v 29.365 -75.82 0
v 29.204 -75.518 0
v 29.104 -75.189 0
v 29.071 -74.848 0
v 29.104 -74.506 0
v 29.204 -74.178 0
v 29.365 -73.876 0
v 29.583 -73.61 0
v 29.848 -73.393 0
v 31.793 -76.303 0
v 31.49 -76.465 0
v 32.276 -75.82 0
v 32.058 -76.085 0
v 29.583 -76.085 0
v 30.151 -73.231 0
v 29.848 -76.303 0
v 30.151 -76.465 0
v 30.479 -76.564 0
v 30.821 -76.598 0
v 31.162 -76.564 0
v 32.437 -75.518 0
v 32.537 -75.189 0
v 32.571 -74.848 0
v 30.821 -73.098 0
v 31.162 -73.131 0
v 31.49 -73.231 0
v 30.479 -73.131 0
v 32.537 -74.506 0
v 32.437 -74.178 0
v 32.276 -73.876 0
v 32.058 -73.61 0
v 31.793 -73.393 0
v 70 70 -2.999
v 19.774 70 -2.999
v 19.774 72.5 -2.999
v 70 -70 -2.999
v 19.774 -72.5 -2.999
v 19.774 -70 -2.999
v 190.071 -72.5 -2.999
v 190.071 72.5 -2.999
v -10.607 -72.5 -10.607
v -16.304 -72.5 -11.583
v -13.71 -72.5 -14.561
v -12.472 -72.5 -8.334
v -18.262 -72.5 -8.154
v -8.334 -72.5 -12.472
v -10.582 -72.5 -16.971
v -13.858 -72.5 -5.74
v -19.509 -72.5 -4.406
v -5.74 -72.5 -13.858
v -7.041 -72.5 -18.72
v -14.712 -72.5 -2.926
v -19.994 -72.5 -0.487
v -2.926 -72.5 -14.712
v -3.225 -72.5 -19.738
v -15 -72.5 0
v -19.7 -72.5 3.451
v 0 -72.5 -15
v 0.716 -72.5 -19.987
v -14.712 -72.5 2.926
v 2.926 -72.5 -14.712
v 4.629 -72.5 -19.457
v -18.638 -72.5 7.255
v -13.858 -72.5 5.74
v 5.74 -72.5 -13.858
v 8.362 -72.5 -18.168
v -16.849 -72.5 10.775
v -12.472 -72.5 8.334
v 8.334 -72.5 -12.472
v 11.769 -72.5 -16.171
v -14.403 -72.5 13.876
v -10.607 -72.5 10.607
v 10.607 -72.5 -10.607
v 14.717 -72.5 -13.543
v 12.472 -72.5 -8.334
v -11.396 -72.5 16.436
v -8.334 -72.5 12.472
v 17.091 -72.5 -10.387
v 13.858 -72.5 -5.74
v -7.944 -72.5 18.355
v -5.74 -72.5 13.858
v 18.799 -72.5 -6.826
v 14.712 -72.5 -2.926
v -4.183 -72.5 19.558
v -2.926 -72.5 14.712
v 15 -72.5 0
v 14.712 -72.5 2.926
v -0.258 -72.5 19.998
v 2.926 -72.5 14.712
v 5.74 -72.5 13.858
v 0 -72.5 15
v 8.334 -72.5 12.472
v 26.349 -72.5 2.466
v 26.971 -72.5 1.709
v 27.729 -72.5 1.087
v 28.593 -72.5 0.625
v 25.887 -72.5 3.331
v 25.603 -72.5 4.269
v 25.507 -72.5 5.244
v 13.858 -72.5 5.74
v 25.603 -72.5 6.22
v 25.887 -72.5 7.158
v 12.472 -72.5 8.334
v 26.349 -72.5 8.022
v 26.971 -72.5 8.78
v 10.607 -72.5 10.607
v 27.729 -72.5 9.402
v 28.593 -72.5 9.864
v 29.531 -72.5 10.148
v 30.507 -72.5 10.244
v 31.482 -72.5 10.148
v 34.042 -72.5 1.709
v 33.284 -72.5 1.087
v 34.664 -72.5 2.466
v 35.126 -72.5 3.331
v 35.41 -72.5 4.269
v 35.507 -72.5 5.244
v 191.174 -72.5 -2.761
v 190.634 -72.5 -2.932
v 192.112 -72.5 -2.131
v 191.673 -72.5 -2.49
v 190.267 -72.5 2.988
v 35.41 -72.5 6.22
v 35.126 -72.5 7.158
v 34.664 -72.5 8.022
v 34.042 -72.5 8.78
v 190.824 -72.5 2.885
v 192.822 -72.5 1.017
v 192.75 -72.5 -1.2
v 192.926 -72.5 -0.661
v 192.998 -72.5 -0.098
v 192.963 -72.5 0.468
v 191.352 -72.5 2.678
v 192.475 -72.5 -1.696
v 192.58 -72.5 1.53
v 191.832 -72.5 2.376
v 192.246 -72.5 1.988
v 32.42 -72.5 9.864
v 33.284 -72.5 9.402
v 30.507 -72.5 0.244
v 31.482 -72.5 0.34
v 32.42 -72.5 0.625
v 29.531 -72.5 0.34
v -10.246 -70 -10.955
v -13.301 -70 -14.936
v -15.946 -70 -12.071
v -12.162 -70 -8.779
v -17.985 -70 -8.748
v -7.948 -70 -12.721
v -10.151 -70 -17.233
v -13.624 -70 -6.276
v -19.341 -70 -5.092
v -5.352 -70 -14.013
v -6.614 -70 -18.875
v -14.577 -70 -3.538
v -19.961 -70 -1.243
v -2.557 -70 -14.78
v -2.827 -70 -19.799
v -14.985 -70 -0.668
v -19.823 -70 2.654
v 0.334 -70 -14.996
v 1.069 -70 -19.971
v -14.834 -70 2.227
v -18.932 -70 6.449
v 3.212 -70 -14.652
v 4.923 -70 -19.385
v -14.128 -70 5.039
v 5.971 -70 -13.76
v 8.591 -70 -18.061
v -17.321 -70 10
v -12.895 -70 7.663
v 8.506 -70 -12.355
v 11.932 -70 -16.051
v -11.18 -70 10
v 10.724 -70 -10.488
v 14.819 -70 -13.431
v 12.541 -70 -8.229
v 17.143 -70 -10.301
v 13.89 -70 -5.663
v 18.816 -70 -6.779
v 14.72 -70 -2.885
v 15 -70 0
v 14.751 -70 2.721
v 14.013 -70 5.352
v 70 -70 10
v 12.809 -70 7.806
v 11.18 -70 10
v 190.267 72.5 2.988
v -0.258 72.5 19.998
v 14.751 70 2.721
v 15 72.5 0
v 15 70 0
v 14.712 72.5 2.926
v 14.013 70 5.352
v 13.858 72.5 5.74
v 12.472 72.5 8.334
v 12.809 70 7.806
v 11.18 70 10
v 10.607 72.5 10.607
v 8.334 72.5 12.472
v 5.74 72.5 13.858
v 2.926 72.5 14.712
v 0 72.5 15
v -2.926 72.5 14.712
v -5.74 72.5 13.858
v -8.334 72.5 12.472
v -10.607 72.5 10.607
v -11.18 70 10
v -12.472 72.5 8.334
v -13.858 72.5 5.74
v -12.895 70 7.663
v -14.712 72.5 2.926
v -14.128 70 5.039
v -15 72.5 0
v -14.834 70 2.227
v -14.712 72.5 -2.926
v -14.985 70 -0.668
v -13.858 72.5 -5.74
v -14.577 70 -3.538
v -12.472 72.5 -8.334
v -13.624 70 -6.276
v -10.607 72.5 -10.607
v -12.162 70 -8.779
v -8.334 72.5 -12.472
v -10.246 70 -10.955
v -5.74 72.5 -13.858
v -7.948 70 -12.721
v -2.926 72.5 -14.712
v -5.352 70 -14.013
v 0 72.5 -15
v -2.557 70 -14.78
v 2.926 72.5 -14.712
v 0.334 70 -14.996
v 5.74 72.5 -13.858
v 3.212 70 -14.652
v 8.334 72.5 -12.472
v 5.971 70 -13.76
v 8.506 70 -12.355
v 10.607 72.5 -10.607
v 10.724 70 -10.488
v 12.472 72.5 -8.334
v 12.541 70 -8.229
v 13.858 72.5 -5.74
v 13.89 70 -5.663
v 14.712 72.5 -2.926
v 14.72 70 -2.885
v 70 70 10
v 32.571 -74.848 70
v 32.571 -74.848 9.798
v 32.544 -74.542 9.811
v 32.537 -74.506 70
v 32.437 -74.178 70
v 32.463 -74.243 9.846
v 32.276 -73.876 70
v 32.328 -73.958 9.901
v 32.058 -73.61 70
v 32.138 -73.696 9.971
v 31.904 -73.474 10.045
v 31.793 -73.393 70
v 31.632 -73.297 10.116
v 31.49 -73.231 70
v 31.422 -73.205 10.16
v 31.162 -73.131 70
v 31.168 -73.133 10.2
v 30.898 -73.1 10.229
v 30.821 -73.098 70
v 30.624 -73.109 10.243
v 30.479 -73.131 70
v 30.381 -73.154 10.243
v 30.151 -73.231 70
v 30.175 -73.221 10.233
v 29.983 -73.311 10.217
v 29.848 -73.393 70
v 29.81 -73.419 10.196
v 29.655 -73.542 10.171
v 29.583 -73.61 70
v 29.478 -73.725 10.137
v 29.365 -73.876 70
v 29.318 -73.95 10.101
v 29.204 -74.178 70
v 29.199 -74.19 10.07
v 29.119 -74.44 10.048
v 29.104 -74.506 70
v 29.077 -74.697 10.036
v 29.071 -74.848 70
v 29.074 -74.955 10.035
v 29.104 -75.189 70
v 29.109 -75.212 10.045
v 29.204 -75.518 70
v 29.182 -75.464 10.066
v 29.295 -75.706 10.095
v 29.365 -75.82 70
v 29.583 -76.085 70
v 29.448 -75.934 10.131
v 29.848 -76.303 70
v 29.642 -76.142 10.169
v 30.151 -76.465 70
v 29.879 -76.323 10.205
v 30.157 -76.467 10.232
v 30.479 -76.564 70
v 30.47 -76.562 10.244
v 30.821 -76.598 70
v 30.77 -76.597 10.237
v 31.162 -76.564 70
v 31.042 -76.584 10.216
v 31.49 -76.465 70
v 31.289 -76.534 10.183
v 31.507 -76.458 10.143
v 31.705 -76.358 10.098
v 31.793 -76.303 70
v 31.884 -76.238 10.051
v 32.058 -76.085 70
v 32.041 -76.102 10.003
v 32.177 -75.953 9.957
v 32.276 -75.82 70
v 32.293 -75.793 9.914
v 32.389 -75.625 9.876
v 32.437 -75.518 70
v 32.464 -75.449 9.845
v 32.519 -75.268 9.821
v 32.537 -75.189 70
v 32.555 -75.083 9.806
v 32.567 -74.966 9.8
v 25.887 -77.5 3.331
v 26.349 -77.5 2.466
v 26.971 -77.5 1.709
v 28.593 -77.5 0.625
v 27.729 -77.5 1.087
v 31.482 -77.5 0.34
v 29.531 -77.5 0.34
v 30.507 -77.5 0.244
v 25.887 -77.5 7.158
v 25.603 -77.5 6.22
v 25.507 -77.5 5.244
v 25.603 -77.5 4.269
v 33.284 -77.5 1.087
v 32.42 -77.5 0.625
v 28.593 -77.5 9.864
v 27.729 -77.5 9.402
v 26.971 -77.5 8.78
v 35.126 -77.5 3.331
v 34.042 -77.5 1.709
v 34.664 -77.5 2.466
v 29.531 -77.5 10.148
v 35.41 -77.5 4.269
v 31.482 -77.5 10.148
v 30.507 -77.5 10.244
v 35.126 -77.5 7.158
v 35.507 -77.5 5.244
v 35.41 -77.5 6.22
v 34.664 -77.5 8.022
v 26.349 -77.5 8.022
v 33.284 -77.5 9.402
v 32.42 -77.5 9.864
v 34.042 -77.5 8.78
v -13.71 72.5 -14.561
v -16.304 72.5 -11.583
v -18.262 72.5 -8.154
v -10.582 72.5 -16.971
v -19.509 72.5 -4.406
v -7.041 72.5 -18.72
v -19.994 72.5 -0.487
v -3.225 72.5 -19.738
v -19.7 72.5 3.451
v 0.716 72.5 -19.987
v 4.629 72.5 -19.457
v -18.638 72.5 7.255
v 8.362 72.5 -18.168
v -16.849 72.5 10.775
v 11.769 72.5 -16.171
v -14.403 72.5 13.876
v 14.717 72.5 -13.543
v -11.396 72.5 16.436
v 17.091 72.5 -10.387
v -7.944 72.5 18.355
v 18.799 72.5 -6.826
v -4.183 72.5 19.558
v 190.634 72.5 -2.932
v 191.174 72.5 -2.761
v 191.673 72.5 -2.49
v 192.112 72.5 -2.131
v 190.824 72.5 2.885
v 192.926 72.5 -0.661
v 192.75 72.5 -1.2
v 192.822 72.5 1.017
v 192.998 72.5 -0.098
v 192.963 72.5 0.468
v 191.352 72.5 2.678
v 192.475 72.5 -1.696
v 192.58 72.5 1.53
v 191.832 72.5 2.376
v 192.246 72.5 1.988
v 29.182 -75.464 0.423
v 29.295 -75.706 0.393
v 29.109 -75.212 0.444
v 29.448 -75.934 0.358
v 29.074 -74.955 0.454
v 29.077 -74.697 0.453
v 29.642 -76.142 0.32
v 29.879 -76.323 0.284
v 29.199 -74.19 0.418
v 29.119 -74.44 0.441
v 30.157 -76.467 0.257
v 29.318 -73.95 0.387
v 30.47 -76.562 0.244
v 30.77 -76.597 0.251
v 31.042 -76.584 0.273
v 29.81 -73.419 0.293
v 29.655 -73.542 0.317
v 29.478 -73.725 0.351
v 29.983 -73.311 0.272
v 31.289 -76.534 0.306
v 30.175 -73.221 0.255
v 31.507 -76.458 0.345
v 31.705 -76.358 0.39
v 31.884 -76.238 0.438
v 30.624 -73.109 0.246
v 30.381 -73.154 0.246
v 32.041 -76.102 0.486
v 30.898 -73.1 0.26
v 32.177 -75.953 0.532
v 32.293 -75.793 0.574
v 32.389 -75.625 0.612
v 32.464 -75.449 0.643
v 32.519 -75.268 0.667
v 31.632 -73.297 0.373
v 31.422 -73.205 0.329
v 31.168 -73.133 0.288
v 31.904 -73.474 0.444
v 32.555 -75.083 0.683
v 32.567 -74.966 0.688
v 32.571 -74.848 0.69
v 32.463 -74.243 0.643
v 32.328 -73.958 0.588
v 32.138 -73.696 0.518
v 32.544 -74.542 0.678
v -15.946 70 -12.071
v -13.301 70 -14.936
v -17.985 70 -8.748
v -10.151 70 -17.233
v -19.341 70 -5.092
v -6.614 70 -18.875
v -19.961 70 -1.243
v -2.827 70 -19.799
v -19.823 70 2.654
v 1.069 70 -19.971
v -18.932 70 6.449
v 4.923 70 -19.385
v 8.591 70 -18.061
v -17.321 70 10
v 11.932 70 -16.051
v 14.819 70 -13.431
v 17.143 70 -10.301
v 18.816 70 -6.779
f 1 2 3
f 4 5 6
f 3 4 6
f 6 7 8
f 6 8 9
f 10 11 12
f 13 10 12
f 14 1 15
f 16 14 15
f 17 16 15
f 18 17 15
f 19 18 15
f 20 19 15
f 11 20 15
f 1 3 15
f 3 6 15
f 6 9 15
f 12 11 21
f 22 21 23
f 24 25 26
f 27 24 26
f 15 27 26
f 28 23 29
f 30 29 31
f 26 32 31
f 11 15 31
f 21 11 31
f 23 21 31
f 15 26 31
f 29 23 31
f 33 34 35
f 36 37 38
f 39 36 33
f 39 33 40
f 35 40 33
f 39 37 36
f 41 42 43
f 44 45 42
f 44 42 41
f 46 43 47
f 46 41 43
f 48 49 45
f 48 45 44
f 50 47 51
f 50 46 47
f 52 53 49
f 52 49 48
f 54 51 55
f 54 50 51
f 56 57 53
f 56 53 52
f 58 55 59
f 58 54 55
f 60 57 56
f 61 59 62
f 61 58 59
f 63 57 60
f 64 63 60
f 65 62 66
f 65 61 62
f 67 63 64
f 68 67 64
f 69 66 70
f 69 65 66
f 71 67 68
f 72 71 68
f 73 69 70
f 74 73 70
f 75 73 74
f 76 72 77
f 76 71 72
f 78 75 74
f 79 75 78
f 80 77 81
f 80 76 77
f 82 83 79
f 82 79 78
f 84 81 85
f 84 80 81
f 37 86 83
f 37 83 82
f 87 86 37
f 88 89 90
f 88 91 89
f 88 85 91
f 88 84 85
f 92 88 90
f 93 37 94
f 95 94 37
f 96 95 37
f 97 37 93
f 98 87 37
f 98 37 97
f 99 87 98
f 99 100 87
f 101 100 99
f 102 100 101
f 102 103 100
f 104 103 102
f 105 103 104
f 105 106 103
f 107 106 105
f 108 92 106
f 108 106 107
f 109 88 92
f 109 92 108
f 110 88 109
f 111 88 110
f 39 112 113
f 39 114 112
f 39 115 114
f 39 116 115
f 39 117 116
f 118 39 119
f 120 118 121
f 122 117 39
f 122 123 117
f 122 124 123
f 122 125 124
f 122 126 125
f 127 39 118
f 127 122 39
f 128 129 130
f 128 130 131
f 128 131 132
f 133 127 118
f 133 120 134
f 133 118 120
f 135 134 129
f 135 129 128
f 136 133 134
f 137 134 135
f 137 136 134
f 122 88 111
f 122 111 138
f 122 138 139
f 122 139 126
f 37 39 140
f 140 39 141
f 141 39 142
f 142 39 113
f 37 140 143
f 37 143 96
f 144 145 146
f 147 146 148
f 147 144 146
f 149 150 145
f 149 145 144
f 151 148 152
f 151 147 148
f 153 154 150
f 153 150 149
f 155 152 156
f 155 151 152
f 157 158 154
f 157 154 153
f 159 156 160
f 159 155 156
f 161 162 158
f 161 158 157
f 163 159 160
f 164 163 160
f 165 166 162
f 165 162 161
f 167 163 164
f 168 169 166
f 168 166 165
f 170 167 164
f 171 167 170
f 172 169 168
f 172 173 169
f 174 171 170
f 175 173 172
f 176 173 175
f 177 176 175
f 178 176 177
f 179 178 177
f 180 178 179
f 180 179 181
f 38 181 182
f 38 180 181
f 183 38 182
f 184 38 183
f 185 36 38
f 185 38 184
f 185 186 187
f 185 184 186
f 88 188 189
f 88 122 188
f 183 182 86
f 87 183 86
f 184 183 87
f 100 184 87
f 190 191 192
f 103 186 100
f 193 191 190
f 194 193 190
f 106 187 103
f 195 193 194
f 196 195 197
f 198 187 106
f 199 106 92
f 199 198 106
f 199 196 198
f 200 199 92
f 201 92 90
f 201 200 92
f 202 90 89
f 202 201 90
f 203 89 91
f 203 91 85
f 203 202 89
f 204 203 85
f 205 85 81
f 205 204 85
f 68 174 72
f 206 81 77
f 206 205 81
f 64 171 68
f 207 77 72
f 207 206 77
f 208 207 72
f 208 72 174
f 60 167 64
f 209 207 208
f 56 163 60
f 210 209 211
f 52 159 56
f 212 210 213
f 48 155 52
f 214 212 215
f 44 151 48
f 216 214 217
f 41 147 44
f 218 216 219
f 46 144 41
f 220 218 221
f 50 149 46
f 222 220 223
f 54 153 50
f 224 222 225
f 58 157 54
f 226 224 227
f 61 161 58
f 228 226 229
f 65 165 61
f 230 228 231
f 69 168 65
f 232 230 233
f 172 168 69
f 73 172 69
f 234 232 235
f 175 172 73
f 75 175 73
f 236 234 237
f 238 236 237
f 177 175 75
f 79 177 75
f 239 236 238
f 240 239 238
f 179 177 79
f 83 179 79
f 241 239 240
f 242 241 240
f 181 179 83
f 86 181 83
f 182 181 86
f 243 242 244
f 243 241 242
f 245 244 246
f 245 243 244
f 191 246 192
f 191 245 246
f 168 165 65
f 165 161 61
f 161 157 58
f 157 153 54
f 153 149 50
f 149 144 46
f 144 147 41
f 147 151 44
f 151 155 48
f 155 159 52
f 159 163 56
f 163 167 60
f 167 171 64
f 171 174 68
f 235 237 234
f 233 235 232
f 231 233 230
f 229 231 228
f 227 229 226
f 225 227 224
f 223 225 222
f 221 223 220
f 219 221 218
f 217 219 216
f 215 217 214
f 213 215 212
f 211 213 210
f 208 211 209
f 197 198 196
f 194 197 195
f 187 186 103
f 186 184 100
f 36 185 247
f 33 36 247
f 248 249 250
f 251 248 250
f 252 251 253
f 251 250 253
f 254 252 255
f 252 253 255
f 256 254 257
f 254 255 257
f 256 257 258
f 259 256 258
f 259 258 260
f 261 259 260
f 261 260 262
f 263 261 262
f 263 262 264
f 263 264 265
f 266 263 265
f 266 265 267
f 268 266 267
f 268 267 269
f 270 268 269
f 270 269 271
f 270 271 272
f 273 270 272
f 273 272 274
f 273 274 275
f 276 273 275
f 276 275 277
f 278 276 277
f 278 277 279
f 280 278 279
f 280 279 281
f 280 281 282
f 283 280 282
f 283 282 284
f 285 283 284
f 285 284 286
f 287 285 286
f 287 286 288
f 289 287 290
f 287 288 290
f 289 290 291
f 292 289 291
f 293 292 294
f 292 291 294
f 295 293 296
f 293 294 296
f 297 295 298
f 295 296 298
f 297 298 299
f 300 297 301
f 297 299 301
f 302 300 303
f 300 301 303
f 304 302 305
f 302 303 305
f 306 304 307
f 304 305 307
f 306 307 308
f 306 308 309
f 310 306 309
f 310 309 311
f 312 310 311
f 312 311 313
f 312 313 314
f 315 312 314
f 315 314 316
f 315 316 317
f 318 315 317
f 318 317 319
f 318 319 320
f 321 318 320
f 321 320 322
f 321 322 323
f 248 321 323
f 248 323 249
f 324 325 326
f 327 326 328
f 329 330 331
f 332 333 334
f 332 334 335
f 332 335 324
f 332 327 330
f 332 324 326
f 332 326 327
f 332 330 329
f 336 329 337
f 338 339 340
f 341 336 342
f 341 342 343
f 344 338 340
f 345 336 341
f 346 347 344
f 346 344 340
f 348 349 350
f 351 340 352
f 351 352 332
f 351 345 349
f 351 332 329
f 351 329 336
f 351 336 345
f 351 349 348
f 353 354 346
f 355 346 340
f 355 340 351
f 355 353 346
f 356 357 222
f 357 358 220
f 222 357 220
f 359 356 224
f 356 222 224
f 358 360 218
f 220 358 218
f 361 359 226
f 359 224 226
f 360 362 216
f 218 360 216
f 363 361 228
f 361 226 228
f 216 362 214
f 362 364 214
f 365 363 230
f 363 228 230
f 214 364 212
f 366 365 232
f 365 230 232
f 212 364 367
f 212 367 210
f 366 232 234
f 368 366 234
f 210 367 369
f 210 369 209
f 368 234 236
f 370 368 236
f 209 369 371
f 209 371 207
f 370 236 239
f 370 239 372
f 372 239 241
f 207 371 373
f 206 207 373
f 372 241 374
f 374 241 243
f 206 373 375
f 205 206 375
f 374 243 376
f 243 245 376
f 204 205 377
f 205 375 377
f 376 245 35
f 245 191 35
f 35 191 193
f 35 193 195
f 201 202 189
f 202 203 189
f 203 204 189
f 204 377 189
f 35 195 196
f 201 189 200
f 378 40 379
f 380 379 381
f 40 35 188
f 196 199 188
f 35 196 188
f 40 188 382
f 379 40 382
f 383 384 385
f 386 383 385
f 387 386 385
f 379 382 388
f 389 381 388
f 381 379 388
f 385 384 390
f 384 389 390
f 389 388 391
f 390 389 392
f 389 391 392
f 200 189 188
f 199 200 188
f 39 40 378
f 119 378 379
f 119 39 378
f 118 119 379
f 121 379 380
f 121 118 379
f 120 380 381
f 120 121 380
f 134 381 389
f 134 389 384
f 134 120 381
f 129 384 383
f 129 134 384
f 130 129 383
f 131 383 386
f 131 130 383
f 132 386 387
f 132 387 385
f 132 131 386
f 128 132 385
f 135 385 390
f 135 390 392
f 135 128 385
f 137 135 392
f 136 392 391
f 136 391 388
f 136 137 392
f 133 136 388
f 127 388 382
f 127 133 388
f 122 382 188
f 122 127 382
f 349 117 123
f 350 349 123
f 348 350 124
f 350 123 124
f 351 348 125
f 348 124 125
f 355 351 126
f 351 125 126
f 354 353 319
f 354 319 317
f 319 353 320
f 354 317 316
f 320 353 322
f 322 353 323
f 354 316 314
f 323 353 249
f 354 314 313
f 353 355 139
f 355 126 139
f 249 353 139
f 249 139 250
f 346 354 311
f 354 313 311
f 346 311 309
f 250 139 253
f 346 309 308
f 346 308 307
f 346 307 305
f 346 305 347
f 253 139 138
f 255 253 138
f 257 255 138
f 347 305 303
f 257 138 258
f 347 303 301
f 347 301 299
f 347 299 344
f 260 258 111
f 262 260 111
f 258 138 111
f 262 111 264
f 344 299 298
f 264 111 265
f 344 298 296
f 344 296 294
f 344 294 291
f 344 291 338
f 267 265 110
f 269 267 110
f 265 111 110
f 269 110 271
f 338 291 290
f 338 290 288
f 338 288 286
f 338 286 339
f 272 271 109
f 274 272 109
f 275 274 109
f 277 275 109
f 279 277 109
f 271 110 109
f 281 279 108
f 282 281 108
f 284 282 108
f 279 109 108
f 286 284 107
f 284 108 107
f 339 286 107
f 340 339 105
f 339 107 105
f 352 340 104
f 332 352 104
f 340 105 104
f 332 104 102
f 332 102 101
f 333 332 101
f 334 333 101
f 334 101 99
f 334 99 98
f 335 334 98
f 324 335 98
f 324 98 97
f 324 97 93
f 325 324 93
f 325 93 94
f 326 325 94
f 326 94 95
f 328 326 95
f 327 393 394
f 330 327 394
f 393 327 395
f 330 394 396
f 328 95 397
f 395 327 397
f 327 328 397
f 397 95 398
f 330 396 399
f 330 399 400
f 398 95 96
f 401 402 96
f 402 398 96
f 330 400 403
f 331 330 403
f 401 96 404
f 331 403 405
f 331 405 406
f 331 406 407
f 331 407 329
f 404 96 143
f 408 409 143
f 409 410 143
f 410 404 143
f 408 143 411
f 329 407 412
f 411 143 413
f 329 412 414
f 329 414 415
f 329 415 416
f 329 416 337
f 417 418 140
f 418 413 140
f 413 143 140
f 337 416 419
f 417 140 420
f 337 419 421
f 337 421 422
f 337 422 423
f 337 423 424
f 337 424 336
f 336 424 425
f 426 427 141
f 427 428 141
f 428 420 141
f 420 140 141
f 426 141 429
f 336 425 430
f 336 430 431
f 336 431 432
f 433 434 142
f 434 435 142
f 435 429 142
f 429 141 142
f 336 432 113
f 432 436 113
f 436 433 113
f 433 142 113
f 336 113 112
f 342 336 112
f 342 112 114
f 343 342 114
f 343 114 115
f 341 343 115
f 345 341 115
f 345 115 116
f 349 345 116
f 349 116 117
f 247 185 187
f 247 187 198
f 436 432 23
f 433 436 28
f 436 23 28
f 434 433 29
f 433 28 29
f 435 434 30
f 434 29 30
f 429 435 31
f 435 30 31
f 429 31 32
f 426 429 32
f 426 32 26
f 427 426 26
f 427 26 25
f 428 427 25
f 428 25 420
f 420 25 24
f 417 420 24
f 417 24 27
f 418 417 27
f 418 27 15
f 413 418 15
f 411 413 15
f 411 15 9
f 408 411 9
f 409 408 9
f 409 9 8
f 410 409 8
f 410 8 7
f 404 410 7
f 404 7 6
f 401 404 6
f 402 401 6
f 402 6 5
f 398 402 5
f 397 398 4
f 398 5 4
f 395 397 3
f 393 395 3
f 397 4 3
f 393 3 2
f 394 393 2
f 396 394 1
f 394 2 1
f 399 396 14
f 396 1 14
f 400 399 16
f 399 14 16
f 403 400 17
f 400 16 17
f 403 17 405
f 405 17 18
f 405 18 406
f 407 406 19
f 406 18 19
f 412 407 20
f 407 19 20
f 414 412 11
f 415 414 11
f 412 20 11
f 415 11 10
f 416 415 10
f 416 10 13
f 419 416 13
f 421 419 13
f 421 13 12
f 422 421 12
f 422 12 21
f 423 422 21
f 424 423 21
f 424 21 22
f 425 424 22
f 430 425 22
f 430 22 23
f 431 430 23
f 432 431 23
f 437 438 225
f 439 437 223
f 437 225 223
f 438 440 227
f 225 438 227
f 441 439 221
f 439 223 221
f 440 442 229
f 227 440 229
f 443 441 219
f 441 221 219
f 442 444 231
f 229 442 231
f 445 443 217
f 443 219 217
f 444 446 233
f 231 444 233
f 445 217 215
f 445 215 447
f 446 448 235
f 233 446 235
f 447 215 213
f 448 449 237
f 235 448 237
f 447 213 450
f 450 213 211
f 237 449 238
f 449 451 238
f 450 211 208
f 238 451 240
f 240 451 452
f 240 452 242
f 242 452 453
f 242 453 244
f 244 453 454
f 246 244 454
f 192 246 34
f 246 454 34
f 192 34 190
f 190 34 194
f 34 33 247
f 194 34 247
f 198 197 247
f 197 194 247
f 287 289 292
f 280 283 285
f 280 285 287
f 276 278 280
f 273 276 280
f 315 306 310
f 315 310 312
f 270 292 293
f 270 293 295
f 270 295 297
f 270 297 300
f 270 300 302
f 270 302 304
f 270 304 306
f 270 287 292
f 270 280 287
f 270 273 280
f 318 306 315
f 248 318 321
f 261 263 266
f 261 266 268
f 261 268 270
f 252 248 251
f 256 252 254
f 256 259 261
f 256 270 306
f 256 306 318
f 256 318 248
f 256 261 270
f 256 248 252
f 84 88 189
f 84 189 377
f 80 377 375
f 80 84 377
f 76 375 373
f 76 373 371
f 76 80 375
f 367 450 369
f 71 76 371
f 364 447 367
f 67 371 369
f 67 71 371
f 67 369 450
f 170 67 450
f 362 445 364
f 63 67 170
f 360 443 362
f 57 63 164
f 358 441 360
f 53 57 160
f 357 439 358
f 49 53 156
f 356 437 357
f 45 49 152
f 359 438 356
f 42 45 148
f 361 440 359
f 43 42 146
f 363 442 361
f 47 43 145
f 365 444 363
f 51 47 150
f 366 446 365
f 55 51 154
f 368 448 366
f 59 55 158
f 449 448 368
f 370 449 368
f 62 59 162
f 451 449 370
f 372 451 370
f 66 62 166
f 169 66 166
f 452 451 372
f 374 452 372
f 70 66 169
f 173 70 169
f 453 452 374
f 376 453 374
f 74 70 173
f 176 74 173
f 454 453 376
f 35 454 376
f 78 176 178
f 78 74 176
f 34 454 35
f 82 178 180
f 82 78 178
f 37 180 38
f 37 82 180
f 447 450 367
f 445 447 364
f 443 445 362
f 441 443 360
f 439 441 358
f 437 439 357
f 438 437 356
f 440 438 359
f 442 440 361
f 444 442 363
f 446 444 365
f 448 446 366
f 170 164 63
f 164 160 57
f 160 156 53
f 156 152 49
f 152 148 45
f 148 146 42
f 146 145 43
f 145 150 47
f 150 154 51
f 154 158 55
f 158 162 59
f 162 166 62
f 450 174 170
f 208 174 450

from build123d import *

# Parameters (mm, degrees)
F0_R     = 15
F1_DEPTH = 72.5
F2_W     = 140
F2_H     = 31.716244
F3_DEPTH = 70
F4_R     = 5
F5_DEPTH = 5
F6_R     = 1.75
F7_DEPTH = 70


with BuildPart() as f1:
    # F0 (on Front) → F1 (new body, symmetric)
    with BuildSketch(Plane.XZ):
        with BuildLine():
            Line((190.266781, 2.988114), (-0.258226, 19.998333))
            ThreePointArc((-0.258226, 19.998333), (-15.080984, -13.136359), (19.773847, -2.999164))
            Line((19.773847, -2.999164), (189.92918, -2.999164))
            Line((189.92918, -2.999164), (190.07082, -2.999164))
            ThreePointArc((190.07082, -2.999164), (192.998394, -0.098136), (190.266781, 2.988114))
        make_face()
        Circle(F0_R, mode=Mode.SUBTRACT)
    extrude(amount=F1_DEPTH, both=True)

    # F2 (on Right) → F3 (cut, symmetric)
    with BuildSketch(Plane.YZ):
        with Locations((0, -5.858122)):
            Rectangle(F2_W, F2_H)
    extrude(amount=F3_DEPTH, both=True, mode=Mode.SUBTRACT)

    # F4 (on face) → F5 (join)
    with BuildSketch(Plane.XZ.offset(72.5)):
        with Locations((30.506512, 5.24428)):
            Circle(F4_R)
    extrude(amount=F5_DEPTH)

    # F6 (on Top) → F7 (join)
    with BuildSketch(Plane.XY):
        with Locations((30.820567, -74.847832)):
            Circle(F6_R)
    extrude(amount=F7_DEPTH)


solid = f1.part
